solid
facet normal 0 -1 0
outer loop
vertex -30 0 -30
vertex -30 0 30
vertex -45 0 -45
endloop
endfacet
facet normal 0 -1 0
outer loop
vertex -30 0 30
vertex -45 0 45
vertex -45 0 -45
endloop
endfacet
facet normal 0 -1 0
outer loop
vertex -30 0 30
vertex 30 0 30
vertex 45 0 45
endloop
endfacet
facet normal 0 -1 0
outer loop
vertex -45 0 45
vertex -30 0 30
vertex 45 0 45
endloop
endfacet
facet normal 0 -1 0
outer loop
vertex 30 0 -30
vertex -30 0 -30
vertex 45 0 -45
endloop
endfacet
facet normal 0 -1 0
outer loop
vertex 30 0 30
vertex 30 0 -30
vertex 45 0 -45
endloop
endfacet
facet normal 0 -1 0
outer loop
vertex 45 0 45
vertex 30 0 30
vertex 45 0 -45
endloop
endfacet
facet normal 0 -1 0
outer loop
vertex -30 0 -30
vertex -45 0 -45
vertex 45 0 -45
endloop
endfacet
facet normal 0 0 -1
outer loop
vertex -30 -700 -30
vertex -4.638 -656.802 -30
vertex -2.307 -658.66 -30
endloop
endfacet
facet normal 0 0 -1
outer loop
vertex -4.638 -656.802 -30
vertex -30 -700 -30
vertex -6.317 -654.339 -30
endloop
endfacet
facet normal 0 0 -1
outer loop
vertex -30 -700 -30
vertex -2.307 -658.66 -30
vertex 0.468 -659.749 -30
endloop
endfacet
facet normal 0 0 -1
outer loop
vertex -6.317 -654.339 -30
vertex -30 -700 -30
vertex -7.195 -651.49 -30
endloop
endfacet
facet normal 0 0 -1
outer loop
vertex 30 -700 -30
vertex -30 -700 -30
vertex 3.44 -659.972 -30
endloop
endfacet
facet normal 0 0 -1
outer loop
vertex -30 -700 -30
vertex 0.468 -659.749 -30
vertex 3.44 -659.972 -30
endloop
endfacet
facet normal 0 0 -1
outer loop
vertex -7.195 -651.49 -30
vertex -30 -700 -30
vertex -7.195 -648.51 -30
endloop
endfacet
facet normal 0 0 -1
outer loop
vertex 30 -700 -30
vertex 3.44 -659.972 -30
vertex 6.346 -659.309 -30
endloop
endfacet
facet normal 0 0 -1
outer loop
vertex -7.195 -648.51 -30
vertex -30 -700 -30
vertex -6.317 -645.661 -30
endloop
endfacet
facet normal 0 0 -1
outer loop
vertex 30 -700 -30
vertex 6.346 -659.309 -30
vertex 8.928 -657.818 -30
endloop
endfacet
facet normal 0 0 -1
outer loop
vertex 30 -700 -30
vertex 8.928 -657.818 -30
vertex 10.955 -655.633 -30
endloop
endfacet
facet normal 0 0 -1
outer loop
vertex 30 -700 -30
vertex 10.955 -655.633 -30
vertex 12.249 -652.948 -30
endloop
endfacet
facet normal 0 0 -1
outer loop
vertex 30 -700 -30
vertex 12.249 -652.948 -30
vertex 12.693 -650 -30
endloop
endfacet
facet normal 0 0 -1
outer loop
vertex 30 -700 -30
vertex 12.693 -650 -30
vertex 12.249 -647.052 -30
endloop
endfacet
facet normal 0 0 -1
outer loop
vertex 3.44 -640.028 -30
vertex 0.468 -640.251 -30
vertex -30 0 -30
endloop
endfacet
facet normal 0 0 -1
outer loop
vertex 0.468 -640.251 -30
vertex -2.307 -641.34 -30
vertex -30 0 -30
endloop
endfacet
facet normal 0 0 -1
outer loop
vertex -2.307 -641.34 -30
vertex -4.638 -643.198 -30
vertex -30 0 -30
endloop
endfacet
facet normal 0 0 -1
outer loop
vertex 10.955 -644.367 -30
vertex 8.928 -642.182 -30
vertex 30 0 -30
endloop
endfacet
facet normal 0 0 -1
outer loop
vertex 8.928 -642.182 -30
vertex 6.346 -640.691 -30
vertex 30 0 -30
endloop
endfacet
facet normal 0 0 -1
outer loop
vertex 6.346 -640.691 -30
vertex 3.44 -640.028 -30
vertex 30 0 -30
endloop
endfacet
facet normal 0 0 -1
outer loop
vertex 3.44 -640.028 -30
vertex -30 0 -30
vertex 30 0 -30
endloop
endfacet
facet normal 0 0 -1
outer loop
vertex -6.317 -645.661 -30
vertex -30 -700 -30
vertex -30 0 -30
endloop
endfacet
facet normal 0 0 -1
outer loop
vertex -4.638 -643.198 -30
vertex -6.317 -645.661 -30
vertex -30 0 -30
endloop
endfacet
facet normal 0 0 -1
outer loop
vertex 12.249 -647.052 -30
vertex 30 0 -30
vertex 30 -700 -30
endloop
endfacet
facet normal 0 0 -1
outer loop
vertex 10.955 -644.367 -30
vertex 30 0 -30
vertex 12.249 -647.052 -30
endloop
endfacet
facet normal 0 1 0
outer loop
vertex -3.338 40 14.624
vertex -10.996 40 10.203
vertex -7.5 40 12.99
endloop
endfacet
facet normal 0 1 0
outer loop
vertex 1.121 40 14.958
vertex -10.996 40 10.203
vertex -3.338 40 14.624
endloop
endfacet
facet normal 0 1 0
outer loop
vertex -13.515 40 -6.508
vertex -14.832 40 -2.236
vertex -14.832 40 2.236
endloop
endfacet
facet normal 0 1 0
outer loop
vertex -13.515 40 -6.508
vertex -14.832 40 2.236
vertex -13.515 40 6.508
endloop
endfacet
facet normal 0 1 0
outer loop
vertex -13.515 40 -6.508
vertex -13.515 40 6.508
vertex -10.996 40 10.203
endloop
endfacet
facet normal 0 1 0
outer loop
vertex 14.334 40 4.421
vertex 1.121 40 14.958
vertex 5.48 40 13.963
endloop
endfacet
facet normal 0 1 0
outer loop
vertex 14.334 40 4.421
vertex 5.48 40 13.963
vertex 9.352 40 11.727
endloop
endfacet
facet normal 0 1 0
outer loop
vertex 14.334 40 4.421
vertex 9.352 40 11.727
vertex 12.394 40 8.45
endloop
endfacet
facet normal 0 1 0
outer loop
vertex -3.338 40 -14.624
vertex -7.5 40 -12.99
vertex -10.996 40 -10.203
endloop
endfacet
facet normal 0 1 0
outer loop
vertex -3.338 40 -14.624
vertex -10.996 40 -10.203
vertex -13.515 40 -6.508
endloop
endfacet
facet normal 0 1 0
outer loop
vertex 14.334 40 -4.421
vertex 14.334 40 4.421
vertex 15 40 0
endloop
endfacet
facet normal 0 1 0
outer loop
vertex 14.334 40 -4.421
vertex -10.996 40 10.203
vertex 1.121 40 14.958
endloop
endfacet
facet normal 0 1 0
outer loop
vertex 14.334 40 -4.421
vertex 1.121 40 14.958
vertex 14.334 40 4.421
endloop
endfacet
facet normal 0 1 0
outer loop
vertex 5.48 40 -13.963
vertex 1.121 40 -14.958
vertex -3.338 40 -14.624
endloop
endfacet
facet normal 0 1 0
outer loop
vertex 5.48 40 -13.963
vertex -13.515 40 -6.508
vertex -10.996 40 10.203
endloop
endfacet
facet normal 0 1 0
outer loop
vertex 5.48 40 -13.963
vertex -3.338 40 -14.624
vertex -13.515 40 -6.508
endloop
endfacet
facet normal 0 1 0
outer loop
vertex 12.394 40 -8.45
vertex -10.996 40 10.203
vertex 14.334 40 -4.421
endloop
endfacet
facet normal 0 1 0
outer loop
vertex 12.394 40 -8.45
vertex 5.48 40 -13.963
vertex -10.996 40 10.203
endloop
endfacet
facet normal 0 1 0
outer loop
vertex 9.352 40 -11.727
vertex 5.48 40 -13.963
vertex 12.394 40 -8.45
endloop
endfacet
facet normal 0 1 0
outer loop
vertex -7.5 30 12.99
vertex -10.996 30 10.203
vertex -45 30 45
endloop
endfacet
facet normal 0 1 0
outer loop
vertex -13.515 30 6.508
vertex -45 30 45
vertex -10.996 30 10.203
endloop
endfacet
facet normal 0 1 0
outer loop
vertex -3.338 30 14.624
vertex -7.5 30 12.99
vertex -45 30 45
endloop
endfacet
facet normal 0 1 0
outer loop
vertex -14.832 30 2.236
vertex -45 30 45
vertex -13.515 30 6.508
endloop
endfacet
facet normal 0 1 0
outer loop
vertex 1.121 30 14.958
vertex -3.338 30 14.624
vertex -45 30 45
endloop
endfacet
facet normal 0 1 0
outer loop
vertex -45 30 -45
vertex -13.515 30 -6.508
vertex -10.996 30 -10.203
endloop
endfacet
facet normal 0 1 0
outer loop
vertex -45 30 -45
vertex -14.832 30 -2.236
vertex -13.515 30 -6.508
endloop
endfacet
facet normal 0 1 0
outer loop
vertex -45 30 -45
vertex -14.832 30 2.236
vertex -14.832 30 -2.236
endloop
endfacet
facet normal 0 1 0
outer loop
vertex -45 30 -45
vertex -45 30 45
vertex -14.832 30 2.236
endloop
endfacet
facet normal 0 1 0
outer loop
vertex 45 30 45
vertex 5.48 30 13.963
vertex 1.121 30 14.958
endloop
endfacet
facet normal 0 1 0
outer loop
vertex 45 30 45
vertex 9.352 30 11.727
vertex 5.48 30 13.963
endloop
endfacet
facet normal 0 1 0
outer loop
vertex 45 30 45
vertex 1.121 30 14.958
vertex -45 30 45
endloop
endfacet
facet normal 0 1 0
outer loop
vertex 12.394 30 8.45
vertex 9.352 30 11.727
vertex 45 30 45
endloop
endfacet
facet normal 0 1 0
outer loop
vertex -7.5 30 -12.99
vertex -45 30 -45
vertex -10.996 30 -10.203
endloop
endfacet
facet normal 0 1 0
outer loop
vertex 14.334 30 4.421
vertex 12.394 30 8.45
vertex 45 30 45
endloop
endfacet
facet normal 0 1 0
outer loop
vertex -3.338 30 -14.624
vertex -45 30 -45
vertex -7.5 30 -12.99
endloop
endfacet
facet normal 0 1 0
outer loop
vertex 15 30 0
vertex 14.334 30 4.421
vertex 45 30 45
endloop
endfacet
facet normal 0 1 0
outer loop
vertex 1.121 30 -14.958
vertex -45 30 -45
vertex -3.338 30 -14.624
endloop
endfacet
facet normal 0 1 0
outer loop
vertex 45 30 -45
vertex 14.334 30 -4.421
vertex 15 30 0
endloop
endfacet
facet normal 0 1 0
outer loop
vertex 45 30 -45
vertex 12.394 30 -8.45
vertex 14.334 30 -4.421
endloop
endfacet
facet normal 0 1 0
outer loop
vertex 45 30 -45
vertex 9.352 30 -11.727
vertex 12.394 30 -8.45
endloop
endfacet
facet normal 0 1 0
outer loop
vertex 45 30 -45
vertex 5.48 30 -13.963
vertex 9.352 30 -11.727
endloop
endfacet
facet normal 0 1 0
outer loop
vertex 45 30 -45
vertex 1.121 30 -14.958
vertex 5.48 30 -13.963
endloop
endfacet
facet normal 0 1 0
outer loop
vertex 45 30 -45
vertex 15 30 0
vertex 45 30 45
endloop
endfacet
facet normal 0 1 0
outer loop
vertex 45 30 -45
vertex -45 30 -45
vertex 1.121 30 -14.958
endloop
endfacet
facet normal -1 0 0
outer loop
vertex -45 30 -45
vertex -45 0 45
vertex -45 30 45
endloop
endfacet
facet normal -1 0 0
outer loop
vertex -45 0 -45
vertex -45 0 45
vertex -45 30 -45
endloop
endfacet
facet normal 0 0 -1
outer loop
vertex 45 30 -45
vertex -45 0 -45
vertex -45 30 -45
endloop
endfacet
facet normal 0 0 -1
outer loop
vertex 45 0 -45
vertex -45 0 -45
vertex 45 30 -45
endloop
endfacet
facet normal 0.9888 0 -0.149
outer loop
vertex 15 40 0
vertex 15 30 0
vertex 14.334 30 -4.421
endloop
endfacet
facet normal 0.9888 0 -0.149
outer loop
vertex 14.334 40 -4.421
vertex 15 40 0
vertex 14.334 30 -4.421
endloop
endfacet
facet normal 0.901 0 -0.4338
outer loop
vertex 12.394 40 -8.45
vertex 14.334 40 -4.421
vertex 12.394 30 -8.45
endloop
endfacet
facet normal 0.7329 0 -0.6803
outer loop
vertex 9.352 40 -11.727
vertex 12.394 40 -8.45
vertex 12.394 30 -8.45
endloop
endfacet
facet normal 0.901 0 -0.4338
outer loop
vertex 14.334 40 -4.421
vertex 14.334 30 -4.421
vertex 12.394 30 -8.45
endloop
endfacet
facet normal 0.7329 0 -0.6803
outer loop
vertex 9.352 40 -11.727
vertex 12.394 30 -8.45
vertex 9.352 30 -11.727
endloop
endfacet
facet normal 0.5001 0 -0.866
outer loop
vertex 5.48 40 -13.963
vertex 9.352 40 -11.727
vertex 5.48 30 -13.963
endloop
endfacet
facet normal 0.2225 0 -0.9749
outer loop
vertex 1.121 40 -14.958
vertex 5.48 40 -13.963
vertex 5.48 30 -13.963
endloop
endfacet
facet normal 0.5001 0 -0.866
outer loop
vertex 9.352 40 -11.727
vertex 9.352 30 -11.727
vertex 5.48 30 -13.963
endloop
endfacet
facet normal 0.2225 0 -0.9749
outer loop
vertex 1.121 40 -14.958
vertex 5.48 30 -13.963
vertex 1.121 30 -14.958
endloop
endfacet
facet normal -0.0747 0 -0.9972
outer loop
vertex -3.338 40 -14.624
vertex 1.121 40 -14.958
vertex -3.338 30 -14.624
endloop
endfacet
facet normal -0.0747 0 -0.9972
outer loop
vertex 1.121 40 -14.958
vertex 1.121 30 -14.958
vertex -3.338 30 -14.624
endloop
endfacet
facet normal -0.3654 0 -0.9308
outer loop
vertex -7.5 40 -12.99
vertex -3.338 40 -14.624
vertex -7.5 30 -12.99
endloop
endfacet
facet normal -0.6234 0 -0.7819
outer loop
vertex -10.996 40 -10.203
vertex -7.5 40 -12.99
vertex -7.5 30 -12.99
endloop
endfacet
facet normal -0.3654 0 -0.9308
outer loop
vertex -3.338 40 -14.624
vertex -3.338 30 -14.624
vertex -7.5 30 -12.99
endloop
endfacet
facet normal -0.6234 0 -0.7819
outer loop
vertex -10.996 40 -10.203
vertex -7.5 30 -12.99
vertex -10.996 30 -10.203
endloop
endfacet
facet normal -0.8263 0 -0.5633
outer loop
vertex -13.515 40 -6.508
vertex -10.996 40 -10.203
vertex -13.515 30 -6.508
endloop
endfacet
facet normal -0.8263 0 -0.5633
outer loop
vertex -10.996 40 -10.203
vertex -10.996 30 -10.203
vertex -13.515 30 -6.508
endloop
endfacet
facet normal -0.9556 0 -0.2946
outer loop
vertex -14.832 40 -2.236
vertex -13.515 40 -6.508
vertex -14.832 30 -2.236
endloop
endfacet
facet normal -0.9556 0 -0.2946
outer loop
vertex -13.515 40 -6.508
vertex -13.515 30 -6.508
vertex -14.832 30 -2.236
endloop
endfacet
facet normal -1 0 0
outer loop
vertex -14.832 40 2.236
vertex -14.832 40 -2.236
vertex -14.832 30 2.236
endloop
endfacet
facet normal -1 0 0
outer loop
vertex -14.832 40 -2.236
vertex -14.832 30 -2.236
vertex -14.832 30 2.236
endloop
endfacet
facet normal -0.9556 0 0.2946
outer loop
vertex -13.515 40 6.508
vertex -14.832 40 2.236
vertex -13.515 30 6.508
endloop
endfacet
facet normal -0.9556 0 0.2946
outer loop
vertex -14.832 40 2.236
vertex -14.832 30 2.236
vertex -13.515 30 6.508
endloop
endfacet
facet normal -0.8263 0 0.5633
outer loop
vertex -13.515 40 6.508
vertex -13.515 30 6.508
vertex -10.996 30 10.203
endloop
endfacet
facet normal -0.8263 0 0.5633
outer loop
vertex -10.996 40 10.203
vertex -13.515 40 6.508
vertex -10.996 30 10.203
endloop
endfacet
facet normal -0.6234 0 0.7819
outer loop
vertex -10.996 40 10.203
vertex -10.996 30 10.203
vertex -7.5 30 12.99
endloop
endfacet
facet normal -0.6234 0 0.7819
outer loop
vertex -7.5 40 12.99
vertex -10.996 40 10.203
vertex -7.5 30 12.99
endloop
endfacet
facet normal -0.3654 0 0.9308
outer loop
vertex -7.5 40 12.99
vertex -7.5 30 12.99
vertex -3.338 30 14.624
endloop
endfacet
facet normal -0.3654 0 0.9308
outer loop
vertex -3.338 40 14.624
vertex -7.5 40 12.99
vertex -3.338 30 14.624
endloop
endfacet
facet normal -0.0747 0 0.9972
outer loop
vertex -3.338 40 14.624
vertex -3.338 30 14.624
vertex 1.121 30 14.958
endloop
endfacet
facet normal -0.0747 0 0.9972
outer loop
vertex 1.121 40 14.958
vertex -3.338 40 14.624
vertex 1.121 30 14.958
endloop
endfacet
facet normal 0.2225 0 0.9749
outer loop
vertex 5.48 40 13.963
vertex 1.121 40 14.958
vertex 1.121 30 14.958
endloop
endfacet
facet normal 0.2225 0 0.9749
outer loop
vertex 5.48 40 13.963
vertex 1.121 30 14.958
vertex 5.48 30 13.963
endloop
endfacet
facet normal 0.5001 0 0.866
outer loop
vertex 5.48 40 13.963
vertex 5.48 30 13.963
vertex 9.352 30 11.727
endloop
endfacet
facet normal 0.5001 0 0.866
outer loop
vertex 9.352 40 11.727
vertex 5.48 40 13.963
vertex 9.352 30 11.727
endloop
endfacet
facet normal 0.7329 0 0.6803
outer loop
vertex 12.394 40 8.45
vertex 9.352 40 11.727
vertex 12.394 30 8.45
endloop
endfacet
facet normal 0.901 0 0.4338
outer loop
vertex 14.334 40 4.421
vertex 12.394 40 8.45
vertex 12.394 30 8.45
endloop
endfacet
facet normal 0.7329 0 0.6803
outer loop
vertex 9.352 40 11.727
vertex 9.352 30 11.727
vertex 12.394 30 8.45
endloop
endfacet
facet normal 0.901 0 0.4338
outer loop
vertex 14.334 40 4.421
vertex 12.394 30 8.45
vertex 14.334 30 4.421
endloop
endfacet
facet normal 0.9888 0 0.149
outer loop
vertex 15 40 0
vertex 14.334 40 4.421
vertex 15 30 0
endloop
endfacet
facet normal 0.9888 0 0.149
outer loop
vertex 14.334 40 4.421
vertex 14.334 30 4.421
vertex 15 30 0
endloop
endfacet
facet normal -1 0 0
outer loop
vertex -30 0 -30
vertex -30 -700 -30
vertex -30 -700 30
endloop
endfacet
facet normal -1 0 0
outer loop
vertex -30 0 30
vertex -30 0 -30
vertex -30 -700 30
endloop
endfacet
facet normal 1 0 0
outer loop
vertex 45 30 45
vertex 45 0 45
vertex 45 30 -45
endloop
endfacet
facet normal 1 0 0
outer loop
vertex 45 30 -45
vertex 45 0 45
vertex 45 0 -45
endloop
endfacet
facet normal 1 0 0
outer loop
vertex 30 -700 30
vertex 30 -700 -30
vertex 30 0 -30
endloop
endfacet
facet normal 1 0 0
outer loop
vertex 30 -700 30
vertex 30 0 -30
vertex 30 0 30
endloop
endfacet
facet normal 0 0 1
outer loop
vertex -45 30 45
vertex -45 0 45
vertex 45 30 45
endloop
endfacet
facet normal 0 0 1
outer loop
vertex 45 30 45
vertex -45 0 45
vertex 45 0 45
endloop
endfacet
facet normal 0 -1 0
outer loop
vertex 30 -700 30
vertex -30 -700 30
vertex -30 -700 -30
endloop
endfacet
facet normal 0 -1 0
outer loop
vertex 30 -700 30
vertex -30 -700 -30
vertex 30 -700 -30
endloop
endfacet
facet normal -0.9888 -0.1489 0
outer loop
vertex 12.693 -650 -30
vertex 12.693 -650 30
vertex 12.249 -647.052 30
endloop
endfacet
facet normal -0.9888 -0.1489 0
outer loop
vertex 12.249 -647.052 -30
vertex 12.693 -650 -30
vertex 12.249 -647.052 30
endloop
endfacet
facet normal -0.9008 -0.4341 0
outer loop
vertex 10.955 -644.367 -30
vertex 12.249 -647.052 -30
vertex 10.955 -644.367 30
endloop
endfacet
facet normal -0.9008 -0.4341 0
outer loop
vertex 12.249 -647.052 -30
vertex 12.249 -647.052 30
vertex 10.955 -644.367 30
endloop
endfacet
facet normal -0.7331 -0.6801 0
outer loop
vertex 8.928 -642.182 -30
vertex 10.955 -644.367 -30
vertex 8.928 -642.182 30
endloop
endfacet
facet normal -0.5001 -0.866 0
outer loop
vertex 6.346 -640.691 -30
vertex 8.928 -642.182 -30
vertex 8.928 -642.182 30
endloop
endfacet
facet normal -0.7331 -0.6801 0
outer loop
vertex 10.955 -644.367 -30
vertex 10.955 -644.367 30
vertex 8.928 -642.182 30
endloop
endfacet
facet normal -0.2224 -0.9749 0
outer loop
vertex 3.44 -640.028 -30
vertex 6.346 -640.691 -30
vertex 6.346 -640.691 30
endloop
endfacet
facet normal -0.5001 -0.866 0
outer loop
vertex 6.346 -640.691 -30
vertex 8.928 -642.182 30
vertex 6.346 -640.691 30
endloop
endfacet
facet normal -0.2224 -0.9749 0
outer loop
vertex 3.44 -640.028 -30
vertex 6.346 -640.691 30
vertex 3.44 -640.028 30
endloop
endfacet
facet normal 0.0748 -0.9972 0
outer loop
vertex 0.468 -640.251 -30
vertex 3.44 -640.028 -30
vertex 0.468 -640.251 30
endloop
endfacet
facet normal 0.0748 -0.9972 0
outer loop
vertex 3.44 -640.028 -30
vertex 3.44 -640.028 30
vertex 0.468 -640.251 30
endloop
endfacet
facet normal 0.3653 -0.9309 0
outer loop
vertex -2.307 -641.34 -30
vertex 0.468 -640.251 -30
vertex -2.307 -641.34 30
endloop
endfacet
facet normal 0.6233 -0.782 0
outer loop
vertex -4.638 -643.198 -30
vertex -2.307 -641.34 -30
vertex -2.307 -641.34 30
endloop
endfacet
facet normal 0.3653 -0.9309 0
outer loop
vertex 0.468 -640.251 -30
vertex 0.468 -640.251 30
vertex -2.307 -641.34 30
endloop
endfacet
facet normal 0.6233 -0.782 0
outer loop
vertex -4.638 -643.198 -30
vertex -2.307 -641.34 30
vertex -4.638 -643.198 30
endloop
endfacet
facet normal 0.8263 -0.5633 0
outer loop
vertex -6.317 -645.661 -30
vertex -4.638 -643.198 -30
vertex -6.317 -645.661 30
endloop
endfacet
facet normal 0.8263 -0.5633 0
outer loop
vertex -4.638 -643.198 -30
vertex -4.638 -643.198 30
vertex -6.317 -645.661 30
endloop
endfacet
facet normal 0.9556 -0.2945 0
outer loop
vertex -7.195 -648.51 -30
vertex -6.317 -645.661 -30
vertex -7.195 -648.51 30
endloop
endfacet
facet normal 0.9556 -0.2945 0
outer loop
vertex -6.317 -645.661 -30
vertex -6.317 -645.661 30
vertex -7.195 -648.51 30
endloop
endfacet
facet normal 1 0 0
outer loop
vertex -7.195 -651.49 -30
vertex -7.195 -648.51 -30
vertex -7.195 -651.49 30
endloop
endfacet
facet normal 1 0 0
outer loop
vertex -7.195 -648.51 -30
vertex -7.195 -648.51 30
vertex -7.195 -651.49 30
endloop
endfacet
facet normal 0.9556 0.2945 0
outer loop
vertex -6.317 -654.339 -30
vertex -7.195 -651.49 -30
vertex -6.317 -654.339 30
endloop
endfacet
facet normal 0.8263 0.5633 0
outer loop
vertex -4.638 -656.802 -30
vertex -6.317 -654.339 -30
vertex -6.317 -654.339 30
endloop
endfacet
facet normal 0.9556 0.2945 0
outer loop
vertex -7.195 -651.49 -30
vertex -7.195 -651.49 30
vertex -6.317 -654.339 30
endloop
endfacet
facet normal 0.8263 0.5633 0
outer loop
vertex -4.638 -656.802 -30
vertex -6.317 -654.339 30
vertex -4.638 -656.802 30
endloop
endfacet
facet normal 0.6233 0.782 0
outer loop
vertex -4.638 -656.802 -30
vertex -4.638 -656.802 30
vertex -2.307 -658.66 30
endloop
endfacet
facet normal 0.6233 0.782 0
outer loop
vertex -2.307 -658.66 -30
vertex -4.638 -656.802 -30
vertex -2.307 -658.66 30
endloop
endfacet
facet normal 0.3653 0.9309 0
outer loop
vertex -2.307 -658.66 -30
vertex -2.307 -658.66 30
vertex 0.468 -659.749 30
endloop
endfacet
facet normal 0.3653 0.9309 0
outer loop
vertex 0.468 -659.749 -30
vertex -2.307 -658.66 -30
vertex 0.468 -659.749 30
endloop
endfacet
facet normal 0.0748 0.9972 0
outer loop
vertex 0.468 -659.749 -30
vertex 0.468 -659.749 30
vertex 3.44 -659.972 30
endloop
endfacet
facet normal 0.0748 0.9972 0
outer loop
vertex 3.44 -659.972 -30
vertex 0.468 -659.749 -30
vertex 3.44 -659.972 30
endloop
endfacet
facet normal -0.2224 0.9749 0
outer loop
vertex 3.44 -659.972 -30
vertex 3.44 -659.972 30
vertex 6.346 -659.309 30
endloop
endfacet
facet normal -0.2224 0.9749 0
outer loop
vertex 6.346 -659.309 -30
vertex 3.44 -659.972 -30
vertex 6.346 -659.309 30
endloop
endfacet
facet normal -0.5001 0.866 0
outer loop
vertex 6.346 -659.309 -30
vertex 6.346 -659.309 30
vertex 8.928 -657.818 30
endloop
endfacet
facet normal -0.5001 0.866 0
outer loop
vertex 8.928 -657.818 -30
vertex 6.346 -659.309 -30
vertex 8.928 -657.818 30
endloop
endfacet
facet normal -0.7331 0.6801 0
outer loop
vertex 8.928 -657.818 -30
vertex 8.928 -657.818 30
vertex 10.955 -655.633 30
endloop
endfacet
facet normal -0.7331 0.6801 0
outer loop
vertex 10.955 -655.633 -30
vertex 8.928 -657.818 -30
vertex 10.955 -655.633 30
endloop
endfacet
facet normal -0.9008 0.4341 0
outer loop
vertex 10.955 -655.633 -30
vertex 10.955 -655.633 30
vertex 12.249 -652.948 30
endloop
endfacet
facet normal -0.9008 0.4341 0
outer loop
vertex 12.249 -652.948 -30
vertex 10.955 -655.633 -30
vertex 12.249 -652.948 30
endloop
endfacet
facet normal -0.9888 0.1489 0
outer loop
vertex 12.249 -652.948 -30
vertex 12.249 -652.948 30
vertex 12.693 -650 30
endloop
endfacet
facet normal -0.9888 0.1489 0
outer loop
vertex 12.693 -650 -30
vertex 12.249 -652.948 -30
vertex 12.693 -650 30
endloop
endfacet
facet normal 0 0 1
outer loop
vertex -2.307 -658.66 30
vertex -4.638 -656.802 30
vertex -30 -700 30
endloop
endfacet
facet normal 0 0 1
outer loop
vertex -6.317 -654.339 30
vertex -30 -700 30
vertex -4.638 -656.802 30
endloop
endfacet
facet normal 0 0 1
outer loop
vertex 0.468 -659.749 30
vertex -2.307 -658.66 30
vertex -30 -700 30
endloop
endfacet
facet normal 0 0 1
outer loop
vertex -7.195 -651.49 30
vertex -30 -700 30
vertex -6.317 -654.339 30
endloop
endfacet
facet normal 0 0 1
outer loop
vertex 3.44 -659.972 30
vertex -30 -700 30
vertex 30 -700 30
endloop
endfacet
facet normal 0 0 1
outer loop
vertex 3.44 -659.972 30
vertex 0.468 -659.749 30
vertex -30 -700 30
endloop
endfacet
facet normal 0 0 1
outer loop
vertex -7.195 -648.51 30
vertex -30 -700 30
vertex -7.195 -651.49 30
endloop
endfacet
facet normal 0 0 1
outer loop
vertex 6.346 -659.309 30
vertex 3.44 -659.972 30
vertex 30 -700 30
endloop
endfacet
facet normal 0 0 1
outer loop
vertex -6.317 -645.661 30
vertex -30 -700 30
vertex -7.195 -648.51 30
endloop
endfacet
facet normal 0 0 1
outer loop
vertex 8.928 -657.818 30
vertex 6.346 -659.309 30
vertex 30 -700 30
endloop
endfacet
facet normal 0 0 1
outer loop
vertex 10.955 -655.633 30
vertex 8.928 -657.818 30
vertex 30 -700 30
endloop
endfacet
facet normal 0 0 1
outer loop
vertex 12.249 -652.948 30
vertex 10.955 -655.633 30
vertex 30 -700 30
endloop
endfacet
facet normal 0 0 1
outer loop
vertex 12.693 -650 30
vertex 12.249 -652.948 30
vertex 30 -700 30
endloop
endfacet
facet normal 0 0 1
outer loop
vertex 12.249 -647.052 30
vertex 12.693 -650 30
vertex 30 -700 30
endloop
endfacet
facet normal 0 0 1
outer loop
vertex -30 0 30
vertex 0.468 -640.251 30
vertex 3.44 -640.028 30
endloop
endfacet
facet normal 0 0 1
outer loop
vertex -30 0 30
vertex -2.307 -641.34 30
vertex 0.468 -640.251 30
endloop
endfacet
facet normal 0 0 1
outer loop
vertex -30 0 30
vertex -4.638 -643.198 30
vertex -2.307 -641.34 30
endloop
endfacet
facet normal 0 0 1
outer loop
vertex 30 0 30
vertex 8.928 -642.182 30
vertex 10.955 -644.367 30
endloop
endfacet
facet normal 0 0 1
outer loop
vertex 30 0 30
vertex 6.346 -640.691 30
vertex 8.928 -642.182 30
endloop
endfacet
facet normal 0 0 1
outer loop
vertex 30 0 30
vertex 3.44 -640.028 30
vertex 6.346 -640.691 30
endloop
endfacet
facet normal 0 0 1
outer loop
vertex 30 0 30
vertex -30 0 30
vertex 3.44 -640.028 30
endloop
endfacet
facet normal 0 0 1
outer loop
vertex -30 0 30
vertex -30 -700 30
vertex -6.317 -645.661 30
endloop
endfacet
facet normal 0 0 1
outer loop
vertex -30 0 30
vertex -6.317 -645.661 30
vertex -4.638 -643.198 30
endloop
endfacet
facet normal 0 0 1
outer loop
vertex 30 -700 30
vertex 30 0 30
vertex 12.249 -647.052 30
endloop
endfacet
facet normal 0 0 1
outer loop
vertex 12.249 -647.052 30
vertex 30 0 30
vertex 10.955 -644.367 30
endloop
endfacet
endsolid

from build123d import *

# Parameters (mm, degrees)
SKETCH1_W           = 90
SKETCH1_H           = 90
BOSS_EXTRUDE1_DEPTH = 30
SKETCH2_W           = 60
SKETCH2_H           = 60
BOSS_EXTRUDE2_DEPTH = 700
SKETCH3_R           = 10
CUT_EXTRUDE1_DEPTH  = 76
SKETCH4_R           = 15
BOSS_EXTRUDE3_DEPTH = 10


with BuildPart() as part:
    # Sketch1 → Boss-Extrude1 (new body)
    with BuildSketch(Plane(origin=(0, 0, 0), x_dir=(1, 0, 0), z_dir=(0, 1, 0))):
        Rectangle(SKETCH1_W, SKETCH1_H)
    extrude(amount=BOSS_EXTRUDE1_DEPTH)

    # Sketch2 → Boss-Extrude2 (add)
    with BuildSketch(Plane.XZ):
        Rectangle(SKETCH2_W, SKETCH2_H)
    extrude(amount=BOSS_EXTRUDE2_DEPTH)

    # Sketch3 → Cut-Extrude1 (cut, through all)
    with BuildSketch(Plane.XY.offset(30)):
        with Locations((2.6929442, -650)):
            Circle(SKETCH3_R)
    extrude(amount=-CUT_EXTRUDE1_DEPTH, mode=Mode.SUBTRACT)

    # Sketch4 → Boss-Extrude3 (add)
    with BuildSketch(Plane(origin=(0, 30, 0), x_dir=(1, 0, 0), z_dir=(0, 1, 0))):
        Circle(SKETCH4_R)
    extrude(amount=BOSS_EXTRUDE3_DEPTH)


solid = part.part
